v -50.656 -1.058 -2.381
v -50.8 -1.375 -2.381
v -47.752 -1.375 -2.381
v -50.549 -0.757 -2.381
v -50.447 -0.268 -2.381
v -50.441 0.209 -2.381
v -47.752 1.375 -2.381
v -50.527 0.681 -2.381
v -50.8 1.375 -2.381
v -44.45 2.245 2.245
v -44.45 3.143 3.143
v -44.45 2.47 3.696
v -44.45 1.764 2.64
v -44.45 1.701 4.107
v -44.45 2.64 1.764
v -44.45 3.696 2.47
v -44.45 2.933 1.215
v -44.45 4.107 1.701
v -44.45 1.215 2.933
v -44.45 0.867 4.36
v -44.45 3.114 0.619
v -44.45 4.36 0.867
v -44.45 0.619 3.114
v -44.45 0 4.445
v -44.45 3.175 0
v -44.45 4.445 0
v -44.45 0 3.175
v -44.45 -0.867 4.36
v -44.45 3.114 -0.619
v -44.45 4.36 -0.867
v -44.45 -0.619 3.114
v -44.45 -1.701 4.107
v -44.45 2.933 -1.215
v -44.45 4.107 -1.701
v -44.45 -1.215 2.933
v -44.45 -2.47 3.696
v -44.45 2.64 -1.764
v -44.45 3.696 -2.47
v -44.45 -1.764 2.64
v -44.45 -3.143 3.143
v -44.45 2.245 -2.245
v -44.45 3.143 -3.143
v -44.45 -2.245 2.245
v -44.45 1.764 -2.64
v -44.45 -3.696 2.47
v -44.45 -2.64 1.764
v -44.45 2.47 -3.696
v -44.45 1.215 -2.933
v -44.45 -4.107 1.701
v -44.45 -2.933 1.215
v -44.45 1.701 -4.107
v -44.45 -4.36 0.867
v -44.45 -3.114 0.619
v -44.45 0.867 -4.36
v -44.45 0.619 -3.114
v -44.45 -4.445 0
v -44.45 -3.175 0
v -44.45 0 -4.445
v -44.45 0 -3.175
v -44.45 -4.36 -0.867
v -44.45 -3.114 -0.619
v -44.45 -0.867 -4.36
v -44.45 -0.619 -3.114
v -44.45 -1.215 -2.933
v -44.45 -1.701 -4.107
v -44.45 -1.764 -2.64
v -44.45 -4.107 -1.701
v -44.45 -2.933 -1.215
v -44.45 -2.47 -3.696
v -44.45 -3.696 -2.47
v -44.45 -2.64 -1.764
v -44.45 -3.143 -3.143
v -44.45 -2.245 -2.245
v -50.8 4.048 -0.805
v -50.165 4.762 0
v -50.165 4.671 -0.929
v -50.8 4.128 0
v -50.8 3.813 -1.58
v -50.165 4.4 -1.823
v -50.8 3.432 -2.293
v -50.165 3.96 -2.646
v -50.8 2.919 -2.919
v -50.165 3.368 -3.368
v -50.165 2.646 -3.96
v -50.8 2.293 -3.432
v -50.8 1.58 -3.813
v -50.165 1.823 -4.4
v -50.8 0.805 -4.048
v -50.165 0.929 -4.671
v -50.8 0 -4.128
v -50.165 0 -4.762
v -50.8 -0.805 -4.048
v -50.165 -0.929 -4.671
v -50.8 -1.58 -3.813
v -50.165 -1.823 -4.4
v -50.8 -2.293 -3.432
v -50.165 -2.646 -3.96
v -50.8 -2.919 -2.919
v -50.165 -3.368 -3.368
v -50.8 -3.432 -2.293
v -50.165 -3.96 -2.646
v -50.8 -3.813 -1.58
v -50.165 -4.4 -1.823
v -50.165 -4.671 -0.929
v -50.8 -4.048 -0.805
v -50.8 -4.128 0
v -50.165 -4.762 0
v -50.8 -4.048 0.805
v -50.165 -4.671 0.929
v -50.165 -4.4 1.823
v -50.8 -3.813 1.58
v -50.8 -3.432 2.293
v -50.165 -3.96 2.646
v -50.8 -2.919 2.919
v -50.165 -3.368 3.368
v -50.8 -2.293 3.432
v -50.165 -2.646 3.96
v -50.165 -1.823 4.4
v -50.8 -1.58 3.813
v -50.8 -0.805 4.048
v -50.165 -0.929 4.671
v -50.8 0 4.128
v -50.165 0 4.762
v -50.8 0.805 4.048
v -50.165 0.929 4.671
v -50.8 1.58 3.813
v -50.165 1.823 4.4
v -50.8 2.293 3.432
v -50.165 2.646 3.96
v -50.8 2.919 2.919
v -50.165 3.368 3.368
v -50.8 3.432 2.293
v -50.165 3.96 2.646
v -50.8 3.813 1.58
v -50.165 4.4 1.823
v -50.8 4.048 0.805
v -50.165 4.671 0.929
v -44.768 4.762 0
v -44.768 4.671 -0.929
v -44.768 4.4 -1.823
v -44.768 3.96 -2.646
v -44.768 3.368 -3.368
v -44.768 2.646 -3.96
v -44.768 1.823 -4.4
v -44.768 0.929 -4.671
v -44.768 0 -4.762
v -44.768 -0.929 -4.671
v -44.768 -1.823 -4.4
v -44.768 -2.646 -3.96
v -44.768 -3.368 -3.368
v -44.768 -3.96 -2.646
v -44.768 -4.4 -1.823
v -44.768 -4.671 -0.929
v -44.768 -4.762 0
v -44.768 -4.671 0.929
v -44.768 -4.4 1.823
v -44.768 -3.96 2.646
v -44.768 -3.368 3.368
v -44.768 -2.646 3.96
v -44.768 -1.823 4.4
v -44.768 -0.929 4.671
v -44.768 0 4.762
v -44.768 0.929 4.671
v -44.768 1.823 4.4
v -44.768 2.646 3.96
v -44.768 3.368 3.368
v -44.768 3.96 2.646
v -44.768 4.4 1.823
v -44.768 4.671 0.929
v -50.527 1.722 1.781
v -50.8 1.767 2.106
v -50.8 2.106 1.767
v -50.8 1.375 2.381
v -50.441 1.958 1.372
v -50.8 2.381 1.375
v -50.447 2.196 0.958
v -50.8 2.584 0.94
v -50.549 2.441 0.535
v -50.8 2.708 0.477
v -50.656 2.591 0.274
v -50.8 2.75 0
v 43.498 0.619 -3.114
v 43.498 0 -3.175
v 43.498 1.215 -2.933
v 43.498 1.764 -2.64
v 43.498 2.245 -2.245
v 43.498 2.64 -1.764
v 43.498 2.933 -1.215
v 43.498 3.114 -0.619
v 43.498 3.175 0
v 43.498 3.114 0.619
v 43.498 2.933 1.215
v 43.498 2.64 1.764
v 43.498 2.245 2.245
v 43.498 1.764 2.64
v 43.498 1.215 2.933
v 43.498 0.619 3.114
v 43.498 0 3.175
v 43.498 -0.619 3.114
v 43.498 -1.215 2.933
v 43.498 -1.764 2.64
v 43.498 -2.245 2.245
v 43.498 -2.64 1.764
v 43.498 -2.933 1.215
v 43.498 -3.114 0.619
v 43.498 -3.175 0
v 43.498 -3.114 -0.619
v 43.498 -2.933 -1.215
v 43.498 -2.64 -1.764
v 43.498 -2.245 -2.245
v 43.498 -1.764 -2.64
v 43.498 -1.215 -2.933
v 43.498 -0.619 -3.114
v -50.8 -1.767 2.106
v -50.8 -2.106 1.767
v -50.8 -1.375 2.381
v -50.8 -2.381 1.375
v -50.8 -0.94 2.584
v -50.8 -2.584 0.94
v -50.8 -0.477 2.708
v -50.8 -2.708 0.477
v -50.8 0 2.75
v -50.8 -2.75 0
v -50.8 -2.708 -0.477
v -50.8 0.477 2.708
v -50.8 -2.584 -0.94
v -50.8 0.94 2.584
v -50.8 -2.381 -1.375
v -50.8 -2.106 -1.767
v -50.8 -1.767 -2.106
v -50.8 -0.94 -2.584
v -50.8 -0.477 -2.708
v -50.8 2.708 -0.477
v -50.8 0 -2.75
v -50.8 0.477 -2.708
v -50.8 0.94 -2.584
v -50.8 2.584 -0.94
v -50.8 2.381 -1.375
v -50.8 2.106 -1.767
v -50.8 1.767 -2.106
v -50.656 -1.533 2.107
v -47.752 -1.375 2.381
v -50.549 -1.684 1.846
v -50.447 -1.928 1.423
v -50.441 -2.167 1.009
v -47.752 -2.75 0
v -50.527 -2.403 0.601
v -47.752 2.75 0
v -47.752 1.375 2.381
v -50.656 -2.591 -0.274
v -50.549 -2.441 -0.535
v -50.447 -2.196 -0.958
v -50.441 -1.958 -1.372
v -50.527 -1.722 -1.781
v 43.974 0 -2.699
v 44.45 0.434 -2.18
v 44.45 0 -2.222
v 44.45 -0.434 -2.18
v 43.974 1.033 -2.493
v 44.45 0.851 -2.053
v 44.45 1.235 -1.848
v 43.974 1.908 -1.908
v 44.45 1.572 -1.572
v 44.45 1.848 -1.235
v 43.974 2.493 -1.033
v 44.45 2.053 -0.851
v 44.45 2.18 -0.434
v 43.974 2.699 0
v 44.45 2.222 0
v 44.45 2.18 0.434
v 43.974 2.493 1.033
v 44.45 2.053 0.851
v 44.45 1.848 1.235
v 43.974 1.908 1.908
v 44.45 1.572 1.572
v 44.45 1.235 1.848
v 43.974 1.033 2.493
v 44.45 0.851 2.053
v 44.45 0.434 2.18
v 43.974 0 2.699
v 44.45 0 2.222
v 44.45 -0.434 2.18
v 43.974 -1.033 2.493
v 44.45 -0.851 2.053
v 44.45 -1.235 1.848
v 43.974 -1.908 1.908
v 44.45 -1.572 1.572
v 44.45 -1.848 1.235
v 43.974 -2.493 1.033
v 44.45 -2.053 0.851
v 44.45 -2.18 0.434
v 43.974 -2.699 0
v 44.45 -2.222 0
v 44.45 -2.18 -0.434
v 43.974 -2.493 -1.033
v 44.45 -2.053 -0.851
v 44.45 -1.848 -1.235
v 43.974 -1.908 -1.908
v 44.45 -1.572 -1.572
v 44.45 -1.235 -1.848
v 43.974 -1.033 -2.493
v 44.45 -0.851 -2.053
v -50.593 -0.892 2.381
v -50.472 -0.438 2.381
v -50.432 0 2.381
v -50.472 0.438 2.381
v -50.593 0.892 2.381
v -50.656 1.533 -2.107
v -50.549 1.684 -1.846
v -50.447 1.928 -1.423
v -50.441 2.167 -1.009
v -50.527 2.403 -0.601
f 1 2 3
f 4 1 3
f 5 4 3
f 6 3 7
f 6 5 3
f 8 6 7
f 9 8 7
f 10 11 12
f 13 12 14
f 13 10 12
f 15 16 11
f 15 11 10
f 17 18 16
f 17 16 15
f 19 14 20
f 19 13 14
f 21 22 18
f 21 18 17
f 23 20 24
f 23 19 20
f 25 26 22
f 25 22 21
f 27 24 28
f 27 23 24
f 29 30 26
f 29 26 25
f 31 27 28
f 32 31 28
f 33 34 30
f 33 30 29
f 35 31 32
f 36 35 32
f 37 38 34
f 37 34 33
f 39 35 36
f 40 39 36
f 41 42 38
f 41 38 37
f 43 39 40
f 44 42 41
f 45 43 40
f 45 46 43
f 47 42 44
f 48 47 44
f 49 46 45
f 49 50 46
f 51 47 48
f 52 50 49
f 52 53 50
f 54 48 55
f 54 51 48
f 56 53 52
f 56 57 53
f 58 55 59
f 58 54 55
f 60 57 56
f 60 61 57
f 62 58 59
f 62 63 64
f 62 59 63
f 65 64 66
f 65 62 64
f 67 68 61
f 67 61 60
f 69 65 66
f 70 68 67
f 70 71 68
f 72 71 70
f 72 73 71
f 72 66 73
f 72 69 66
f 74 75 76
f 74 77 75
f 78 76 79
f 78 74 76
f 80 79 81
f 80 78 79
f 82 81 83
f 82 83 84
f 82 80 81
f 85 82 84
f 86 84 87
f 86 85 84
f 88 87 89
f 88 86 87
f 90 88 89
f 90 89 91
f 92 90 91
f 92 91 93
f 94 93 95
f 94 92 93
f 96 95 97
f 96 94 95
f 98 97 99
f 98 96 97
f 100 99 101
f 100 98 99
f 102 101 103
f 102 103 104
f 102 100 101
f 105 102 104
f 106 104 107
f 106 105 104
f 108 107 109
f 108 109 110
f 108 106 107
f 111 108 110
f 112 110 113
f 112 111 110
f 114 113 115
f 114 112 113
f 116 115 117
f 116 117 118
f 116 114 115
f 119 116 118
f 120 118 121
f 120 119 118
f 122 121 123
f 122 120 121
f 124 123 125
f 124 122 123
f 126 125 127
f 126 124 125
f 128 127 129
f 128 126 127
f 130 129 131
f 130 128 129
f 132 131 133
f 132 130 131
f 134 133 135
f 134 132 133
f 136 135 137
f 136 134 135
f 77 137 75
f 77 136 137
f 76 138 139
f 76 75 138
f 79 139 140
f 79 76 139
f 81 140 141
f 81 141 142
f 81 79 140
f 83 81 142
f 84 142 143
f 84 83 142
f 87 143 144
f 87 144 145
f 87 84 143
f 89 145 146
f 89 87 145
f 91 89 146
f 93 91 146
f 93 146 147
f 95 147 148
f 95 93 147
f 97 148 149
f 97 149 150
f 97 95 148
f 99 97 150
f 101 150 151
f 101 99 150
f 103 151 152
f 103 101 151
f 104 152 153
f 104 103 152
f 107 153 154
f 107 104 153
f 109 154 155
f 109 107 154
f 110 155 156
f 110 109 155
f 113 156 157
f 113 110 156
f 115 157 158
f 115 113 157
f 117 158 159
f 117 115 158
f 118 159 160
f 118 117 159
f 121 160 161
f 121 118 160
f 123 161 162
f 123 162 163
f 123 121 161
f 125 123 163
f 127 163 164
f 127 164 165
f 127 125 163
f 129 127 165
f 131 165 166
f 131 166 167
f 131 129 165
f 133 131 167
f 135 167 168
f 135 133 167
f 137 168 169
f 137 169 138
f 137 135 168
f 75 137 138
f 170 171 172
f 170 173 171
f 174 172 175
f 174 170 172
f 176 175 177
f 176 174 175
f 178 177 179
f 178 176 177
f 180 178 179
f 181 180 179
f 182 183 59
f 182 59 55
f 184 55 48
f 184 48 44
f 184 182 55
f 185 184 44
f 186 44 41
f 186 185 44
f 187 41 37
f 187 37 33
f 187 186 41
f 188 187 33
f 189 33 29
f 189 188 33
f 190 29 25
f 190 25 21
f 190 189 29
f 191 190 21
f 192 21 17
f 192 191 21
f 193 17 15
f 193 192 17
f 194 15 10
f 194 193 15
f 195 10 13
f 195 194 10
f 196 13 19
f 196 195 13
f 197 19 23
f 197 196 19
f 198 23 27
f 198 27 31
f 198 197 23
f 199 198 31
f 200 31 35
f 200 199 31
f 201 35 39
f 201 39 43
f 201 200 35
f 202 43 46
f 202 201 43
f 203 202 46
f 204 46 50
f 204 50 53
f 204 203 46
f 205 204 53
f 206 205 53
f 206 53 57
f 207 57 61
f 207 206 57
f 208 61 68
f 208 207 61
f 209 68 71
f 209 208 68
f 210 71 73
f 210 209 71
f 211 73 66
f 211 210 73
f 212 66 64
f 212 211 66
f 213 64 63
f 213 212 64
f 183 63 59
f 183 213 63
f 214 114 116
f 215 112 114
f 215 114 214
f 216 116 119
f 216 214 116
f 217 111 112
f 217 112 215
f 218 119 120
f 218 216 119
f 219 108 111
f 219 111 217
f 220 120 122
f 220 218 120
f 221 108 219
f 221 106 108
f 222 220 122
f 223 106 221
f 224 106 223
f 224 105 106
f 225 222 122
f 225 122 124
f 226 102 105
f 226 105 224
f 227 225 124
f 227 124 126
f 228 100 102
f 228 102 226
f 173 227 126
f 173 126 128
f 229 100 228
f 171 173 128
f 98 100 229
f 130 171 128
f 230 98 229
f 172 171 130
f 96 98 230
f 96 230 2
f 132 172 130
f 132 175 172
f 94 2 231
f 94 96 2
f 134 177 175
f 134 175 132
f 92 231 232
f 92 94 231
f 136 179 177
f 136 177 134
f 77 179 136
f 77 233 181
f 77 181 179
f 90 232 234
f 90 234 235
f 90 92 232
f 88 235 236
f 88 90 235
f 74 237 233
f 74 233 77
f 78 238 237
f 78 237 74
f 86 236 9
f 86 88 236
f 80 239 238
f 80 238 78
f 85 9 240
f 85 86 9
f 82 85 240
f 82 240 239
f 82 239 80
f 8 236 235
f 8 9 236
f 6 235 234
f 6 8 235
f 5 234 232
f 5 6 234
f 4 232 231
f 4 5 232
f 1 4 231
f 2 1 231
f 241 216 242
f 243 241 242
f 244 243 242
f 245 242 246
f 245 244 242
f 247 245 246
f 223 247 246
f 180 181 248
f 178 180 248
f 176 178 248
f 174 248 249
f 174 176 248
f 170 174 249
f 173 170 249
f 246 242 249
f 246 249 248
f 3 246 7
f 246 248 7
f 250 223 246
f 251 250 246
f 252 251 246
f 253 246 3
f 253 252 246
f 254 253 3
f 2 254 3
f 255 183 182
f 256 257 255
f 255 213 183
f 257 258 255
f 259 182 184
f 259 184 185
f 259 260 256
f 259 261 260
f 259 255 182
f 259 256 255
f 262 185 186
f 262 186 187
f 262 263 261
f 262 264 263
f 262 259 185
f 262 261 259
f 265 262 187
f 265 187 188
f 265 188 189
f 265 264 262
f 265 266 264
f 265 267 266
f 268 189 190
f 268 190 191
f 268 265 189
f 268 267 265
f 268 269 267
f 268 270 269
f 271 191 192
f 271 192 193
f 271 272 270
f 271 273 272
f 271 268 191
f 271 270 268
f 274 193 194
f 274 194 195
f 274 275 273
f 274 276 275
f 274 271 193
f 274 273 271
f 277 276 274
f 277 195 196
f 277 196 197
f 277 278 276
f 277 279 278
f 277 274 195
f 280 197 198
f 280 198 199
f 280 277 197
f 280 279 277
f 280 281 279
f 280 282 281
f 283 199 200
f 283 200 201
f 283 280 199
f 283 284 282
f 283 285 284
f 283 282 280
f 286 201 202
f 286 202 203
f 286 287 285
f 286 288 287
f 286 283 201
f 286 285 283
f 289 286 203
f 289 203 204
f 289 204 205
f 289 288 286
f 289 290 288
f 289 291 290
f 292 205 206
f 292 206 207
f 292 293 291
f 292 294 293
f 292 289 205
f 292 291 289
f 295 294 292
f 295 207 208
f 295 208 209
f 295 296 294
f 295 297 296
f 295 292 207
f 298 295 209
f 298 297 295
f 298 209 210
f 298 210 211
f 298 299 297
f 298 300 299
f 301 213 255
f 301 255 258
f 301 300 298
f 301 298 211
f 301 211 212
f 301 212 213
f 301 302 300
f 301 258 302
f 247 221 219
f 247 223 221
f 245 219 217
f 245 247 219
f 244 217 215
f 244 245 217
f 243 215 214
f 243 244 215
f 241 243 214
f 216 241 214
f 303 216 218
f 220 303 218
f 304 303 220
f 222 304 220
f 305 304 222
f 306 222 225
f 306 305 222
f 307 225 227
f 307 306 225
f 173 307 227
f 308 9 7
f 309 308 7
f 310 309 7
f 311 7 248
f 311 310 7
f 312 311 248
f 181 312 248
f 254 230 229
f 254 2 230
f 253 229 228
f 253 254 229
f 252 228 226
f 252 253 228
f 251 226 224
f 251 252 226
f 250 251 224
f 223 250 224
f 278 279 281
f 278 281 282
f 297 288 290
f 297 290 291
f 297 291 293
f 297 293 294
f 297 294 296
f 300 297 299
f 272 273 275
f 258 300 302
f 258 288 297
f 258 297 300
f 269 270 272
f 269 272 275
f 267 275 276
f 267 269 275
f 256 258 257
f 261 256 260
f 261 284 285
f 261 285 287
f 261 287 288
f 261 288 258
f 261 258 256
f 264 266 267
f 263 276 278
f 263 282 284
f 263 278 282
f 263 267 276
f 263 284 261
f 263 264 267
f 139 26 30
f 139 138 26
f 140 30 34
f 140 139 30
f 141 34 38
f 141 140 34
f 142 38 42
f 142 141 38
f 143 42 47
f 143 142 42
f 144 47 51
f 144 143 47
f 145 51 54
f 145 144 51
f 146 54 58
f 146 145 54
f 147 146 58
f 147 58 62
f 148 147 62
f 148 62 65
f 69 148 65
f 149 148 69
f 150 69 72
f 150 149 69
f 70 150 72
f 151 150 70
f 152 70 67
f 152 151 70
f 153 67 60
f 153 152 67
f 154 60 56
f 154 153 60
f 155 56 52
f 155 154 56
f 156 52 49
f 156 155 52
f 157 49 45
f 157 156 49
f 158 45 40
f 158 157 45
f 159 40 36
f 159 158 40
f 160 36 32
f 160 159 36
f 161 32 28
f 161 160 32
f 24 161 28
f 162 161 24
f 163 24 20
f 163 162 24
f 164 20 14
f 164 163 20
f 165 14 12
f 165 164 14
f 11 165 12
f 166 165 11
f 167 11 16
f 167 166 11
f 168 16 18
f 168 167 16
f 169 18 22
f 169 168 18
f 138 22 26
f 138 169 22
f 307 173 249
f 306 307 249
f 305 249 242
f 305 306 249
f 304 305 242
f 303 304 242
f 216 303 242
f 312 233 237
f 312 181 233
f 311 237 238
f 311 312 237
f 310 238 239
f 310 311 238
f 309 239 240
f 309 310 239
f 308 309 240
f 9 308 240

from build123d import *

# Parameters (mm, degrees)
SKETCH2_R           = 3.175
BOSS_EXTRUDE1_DEPTH = 88.9
CHAMFER1_SIZE       = 0.9525
CUT_EXTRUDE1_DEPTH  = 3.048
SKETCH8_R           = 2.749630657
CUT_EXTRUDE2_DEPTH  = 1.27
CUT_EXTRUDE2_TAPER  = 45


with BuildPart() as part:
    # Sketch2 → Boss-Extrude1 (new body)
    with BuildSketch(Plane(origin=(44.45, 0, 0), x_dir=(0, 0, -1), z_dir=(1, 0, 0))):
        Circle(SKETCH2_R)
    extrude(amount=-BOSS_EXTRUDE1_DEPTH)

    # Chamfer1
    chamfer1_edges = [part.edges().sort_by_distance(p)[0] for p in [
        (44.45, 0, 3.175),
    ]]
    chamfer(chamfer1_edges, length=CHAMFER1_SIZE)

    # Sketch6 → Revolve1 (revolve)
    with BuildSketch(Plane.XY):
        Polygon((-50.165, 4.7625), (-50.8, 4.1275), (-50.8, 0), (-44.45, 0), (-44.45, 4.445), (-44.7675, 4.7625), align=None)
    revolve(axis=Axis((-44.45, 0, 0), (-1, 0, 0)))

    # Sketch4 → Cut-Extrude1 (cut)
    with BuildSketch(Plane(origin=(-50.8, 0, 0), x_dir=(0, 0, -1), z_dir=(1, 0, 0))):
        Polygon((0, 2.749630657), (-2.38125, 1.374815329), (-2.38125, -1.374815329), (0, -2.749630657), (2.38125, -1.374815329), (2.38125, 1.374815329), align=None)
    extrude(amount=CUT_EXTRUDE1_DEPTH, mode=Mode.SUBTRACT)

    # Sketch8 → Cut-Extrude2 (cut)
    with BuildSketch(Plane.ZY.offset(50.8)):
        Circle(SKETCH8_R)
    extrude(amount=-CUT_EXTRUDE2_DEPTH, taper=CUT_EXTRUDE2_TAPER, mode=Mode.SUBTRACT)


solid = part.part
